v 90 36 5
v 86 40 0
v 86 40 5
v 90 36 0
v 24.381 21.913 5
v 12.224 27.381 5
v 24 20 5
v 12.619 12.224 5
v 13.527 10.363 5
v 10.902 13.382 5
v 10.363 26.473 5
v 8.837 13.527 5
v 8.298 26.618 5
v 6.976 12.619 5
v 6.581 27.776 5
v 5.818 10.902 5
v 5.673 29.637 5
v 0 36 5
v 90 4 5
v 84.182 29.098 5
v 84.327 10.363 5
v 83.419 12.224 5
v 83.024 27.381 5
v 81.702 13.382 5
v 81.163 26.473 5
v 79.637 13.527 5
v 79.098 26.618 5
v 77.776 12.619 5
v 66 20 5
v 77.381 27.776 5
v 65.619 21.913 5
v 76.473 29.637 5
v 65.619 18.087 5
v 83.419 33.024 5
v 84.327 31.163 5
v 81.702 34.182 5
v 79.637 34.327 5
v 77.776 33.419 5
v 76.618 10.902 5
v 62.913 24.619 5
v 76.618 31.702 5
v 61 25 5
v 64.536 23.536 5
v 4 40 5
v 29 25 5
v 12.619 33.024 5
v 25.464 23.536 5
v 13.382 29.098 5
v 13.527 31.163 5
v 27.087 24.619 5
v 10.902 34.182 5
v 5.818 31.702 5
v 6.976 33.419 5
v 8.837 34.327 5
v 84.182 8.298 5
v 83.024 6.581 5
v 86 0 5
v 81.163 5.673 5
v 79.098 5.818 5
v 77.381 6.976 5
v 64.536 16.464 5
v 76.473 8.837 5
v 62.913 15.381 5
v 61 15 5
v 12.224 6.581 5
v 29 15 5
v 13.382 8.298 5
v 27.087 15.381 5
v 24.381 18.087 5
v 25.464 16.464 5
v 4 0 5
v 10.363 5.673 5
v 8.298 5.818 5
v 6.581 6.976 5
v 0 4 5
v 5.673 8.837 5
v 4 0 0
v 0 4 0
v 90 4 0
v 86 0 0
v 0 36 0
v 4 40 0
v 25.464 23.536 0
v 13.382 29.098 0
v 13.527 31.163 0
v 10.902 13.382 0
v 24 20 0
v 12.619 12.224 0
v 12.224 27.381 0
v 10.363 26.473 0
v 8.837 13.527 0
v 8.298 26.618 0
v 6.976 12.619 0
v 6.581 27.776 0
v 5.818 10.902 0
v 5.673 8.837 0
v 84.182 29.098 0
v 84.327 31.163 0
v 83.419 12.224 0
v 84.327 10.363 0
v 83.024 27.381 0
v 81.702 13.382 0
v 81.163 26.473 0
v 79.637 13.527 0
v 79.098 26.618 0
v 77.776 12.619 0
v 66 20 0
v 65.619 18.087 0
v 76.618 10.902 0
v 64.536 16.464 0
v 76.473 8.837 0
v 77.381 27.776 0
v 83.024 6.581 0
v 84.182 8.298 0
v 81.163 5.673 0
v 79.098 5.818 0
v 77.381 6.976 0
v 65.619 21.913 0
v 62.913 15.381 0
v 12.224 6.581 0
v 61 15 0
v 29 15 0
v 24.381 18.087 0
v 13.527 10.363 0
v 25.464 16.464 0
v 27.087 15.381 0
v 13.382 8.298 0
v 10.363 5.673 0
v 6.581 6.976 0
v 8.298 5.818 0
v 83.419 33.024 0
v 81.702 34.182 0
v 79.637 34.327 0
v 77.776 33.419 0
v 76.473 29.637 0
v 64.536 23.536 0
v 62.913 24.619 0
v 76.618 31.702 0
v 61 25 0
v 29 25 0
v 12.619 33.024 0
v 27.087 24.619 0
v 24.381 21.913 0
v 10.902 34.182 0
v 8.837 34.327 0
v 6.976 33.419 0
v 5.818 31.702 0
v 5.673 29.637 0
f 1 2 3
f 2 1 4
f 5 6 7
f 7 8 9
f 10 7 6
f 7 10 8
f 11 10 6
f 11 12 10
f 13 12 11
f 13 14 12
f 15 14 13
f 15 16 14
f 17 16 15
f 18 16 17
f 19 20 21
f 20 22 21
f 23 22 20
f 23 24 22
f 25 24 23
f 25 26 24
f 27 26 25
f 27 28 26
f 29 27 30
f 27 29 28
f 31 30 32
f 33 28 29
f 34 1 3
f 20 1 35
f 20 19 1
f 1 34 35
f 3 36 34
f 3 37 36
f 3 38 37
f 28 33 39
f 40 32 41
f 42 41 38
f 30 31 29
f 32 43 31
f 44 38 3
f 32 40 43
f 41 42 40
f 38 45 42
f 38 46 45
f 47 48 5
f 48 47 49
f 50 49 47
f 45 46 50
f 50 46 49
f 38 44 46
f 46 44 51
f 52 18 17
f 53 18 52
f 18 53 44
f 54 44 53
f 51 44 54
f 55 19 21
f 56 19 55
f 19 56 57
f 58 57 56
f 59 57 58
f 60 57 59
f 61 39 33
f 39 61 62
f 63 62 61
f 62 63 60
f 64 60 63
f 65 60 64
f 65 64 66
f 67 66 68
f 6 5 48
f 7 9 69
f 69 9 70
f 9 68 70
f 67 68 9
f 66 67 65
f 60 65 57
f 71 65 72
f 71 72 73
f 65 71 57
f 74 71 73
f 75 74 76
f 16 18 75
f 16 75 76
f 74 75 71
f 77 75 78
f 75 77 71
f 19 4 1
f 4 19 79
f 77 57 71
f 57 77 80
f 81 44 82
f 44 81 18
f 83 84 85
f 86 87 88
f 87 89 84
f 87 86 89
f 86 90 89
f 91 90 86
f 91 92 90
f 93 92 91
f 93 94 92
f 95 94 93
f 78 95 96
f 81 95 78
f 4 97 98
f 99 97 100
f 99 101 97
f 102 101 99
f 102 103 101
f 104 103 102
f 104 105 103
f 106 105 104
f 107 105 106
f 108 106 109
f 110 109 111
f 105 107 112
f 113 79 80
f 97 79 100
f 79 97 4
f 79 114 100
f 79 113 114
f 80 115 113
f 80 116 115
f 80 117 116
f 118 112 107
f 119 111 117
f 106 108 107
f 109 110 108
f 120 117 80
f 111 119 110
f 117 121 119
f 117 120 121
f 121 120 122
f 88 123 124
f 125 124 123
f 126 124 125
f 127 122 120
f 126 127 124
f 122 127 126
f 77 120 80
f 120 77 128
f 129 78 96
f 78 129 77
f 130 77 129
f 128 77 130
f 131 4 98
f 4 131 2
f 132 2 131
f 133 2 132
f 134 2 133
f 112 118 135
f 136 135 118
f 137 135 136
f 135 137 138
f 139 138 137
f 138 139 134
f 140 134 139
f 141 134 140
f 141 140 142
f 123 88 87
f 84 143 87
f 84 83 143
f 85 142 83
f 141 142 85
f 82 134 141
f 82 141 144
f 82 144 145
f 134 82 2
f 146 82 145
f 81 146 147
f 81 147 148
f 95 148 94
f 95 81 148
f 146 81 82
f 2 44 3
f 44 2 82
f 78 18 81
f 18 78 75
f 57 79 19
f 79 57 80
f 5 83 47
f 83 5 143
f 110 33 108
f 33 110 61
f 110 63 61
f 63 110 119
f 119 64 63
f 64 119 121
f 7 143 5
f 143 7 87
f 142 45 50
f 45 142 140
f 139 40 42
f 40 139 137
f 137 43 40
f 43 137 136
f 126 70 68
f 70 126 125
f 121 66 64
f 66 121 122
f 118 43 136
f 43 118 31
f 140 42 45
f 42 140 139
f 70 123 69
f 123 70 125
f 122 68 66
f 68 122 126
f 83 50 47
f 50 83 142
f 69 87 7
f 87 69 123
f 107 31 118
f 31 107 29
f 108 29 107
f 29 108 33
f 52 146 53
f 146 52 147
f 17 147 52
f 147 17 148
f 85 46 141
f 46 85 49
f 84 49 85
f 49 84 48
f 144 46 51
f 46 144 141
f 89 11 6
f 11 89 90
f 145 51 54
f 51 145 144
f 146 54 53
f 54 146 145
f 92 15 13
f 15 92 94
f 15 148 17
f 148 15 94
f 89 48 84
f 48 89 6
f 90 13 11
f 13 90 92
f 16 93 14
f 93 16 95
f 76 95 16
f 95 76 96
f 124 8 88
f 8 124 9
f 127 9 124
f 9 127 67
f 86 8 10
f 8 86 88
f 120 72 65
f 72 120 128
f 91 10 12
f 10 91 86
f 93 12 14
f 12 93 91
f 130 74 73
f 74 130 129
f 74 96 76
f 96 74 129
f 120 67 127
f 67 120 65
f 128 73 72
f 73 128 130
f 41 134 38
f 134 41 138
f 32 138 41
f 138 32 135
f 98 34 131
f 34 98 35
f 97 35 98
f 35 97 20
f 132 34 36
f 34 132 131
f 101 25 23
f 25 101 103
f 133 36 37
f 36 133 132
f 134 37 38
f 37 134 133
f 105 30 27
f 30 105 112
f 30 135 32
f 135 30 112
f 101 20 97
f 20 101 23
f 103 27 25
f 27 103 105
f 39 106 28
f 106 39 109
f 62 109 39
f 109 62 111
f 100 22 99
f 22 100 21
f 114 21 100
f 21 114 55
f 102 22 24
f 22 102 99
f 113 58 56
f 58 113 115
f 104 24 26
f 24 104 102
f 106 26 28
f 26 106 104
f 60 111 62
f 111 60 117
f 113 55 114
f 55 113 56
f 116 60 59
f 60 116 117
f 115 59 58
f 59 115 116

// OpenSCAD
$fn = 32;

// ----------------------------------------------------------------------
// Bracket plate: slot plate 90 x 40
// ----------------------------------------------------------------------

// --- parameters (mm) ---
hole_r = 4;               // bolt hole radius
plate_t = 5;              // plate thickness, Z (extrusion height)
plate_l = 90;             // plate length
plate_w = 40;             // plate width
slot_l = 32;              // slot straight length
slot_r = 5;               // slot end radius

slot_len = slot_l + 2 * slot_r;
slot_w = 2 * slot_r;
hole_d2 = 2 * hole_r;

profile = [[4, 0], [86, 0], [90, 4], [90, 36], [86, 40], [4, 40], [0, 36], [0, 4]];  // primary outline, 8 points, counter clockwise
void_1 = [[61, 15], [62.913, 15.381], [64.536, 16.464], [65.619, 18.087], [66, 20], [65.619, 21.913], [64.536, 23.536], [62.913, 24.619], [61, 25], [29, 25], [27.087, 24.619], [25.464, 23.536], [24.381, 21.913], [24, 20], [24.381, 18.087], [25.464, 16.464], [27.087, 15.381], [29, 15]];  // grip slot, 18 points
void_2 = [[13.527, 31.163], [12.619, 33.024], [10.902, 34.182], [8.837, 34.327], [6.976, 33.419], [5.818, 31.702], [5.673, 29.637], [6.581, 27.776], [8.298, 26.618], [10.363, 26.473], [12.224, 27.381], [13.382, 29.098]];  // corner hole, 12 points
void_3 = [[13.527, 10.363], [12.619, 12.224], [10.902, 13.382], [8.837, 13.527], [6.976, 12.619], [5.818, 10.902], [5.673, 8.837], [6.581, 6.976], [8.298, 5.818], [10.363, 5.673], [12.224, 6.581], [13.382, 8.298]];  // corner hole, 12 points
void_4 = [[84.327, 31.163], [83.419, 33.024], [81.702, 34.182], [79.637, 34.327], [77.776, 33.419], [76.618, 31.702], [76.473, 29.637], [77.381, 27.776], [79.098, 26.618], [81.163, 26.473], [83.024, 27.381], [84.182, 29.098]];  // corner hole, 12 points
void_5 = [[84.327, 10.363], [83.419, 12.224], [81.702, 13.382], [79.637, 13.527], [77.776, 12.619], [76.618, 10.902], [76.473, 8.837], [77.381, 6.976], [79.098, 5.818], [81.163, 5.673], [83.024, 6.581], [84.182, 8.298]];  // corner hole, 12 points

// --- the one profile operation ---
difference() {
  linear_extrude(height = plate_t) polygon(points = profile);
  translate([0, 0, -1])
    linear_extrude(height = plate_t + 2) polygon(points = void_1);
  translate([0, 0, -1])
    linear_extrude(height = plate_t + 2) polygon(points = void_2);
  translate([0, 0, -1])
    linear_extrude(height = plate_t + 2) polygon(points = void_3);
  translate([0, 0, -1])
    linear_extrude(height = plate_t + 2) polygon(points = void_4);
  translate([0, 0, -1])
    linear_extrude(height = plate_t + 2) polygon(points = void_5);
}
